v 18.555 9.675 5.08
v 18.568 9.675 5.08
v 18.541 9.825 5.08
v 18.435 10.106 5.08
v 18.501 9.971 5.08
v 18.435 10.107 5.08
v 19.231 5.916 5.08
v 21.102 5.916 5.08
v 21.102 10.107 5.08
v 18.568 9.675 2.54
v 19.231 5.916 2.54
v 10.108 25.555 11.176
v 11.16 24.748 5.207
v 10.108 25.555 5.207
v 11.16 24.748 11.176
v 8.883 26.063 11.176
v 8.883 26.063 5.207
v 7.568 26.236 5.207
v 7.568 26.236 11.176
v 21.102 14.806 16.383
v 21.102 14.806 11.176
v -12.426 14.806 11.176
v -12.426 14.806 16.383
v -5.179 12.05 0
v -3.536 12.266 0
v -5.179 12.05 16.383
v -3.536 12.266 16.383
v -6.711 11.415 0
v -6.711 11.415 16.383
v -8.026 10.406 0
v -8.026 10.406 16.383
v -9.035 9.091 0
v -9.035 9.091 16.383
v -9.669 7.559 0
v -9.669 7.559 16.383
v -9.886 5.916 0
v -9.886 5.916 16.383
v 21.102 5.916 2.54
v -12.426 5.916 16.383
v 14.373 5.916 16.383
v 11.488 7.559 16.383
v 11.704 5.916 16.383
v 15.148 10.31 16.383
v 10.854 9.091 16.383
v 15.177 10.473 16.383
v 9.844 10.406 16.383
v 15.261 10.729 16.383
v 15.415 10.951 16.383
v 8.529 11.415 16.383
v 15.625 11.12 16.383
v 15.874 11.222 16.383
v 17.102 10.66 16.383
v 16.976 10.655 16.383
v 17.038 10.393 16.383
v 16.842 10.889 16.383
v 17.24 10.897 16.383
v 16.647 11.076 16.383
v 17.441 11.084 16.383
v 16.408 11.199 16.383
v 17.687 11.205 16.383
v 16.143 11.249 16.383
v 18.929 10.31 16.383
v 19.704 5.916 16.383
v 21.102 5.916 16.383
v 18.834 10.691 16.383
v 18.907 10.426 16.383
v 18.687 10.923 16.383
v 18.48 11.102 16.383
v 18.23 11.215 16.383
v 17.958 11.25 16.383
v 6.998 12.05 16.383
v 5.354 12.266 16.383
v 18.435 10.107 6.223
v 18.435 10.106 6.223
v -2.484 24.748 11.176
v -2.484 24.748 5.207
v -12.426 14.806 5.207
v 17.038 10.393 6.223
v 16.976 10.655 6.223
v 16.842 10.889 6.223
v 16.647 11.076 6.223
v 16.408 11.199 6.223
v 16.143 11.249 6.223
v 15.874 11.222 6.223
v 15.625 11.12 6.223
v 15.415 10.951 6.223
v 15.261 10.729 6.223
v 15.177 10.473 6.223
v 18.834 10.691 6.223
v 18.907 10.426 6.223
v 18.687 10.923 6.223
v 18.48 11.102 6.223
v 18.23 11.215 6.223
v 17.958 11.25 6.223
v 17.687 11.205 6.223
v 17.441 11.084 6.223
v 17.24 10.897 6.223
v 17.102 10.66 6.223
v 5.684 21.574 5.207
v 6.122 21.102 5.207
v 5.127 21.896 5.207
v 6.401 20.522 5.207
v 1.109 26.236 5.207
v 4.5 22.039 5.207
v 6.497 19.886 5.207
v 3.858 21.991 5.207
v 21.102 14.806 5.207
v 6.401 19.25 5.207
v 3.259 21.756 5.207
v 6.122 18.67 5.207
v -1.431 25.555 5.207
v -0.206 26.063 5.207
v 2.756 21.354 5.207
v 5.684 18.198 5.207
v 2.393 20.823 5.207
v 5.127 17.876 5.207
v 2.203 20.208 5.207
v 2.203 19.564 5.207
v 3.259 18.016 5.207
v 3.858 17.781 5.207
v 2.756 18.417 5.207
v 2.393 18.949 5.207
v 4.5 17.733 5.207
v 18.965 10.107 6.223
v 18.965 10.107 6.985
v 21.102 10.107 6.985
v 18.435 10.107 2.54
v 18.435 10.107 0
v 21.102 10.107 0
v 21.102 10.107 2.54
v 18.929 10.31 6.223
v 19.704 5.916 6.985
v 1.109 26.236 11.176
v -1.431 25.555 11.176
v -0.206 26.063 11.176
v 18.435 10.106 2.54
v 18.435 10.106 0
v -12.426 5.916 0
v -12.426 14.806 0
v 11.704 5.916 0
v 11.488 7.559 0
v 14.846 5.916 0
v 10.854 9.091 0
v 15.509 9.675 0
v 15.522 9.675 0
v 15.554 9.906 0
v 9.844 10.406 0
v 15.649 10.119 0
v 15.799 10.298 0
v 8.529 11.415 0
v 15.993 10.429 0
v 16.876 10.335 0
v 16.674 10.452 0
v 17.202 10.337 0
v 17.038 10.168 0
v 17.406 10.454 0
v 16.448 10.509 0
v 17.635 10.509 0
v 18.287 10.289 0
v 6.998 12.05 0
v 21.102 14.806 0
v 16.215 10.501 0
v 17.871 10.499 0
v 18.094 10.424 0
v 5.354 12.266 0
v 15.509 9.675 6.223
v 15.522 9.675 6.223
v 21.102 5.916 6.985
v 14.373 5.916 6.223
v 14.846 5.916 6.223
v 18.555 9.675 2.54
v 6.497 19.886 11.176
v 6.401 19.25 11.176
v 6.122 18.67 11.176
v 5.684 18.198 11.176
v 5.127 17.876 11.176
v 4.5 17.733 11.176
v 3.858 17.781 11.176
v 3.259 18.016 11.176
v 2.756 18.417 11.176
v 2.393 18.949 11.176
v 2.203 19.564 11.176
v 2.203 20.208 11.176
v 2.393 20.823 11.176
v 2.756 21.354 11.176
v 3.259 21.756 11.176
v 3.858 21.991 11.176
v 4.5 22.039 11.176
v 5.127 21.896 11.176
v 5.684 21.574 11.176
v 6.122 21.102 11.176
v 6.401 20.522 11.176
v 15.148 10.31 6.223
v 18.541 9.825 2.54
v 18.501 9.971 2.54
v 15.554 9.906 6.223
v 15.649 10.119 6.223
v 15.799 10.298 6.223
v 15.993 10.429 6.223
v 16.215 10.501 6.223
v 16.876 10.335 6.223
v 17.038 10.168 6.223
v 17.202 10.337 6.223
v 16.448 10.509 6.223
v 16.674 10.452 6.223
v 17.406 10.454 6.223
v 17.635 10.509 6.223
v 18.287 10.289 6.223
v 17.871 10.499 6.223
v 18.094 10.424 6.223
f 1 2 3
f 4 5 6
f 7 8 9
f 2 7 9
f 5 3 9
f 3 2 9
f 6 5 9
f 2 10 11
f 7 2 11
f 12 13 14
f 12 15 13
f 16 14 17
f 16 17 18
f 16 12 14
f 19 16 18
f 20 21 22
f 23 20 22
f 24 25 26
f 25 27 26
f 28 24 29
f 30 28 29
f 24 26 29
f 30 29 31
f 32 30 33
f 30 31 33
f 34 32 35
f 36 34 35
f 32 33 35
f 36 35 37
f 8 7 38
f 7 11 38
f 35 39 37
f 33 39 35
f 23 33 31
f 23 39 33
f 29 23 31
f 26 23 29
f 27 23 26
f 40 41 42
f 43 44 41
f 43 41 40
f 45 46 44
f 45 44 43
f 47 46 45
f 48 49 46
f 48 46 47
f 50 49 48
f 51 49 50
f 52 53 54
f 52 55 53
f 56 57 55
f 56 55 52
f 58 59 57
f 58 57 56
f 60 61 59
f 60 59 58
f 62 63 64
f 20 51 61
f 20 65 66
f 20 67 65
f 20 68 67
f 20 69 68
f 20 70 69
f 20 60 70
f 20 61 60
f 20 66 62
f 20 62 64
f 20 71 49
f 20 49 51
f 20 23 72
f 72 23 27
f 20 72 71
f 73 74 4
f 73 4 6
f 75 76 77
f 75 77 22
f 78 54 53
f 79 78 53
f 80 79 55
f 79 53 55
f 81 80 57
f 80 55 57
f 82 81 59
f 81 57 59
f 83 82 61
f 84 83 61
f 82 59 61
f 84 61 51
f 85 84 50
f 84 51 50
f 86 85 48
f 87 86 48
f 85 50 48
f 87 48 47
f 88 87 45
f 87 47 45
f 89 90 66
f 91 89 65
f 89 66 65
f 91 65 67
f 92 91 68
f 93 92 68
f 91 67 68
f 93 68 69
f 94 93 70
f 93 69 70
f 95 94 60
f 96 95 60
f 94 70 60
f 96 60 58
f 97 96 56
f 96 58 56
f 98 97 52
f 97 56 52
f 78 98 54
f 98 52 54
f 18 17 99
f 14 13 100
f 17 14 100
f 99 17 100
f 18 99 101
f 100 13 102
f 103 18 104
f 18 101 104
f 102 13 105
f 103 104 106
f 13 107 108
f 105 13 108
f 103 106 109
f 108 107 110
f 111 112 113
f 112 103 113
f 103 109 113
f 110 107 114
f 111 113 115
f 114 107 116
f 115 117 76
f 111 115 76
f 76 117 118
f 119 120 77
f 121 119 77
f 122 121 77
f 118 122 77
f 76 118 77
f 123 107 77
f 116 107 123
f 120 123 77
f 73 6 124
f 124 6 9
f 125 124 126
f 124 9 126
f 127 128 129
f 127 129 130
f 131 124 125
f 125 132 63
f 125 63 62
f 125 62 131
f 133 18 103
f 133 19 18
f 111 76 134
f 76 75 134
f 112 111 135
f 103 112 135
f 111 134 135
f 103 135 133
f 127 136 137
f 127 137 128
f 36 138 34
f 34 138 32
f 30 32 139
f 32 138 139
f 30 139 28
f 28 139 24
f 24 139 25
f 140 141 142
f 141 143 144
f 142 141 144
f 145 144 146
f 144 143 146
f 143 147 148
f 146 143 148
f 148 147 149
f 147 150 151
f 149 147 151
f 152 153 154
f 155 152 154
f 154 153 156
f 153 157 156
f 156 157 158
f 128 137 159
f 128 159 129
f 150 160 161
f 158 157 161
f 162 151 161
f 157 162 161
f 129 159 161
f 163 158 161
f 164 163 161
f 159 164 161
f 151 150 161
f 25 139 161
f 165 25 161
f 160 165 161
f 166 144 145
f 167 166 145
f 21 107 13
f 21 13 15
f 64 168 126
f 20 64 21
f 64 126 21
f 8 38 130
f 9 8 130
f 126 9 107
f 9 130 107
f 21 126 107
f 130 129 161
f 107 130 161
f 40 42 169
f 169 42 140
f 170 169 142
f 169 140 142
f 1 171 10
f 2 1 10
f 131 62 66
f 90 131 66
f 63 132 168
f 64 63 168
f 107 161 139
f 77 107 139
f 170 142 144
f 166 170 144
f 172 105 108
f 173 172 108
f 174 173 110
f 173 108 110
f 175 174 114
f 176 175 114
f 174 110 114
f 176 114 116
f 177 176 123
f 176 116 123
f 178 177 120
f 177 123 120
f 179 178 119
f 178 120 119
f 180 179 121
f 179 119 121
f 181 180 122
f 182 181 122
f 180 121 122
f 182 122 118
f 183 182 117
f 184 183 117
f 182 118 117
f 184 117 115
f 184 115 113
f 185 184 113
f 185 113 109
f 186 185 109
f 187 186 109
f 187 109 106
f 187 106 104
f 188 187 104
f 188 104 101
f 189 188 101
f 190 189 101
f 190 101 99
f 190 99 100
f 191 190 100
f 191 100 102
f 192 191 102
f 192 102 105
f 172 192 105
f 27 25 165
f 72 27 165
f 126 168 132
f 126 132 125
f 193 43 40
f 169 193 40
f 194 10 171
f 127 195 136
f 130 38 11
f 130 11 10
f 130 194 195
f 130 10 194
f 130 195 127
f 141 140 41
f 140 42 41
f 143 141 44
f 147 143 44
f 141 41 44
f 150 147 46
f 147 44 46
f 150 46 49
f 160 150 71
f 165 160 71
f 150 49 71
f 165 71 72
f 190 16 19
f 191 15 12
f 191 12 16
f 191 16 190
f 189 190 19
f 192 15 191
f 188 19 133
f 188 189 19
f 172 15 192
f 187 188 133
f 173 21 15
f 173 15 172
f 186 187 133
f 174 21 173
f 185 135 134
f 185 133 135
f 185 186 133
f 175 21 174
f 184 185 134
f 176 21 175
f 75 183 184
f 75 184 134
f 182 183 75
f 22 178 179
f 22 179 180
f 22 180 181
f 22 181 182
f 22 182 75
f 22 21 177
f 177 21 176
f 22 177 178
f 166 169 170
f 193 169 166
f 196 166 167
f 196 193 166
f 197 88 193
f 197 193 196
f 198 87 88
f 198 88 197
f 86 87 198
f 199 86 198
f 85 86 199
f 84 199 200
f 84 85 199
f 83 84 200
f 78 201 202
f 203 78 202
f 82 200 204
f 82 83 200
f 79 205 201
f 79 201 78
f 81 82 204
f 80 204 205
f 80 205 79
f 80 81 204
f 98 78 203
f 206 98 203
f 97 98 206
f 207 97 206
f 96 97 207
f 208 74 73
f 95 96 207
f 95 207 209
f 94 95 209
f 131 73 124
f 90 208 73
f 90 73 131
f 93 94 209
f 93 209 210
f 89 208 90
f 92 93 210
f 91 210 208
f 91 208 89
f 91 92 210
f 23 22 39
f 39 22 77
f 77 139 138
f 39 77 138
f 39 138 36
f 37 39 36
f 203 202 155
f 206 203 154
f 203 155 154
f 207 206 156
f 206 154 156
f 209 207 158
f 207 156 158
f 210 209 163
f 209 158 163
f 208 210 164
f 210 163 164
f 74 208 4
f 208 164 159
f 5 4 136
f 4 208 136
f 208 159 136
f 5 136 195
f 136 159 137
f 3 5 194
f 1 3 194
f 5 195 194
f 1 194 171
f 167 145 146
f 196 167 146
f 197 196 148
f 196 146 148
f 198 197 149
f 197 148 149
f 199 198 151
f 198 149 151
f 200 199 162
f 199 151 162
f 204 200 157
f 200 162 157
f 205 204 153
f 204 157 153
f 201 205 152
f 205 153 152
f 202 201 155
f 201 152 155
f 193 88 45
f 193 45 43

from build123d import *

# Parameters (mm, degrees)
F1_DEPTH  = 16.383
F2_W      = 33.528
F2_H      = 5.969
F3_DEPTH  = 11.43
F4_SIZE   = 11.43
F5_R      = 2.159
F6_DEPTH  = 25.4
F8_DEPTH  = 6.35
F10_DEPTH = 10.16
F11_R     = 6.34999
F12_W     = 4.191
F12_H     = 2.54
F12_H_2   = 1.905
F13_DEPTH = 2.667
F14_R     = 5.08


# Not quite as in the source:
# - a fillet or chamfer is up to 0.001 mm smaller than in the source, because OpenCascade refuses the exact size


with BuildPart() as f1:
    # F0 (on Top) → F1 (new body)
    with BuildSketch(Plane.XY):
        Polygon((21.1023603916, 14.8059087365), (-12.4256396084, 14.8059087365), (-12.4256396084, 5.9159087365), (-9.8856396084, 5.9159087365), (-9.8856396084, 12.2659087365), (11.7043603916, 12.2659087365), (11.7043603916, 5.9159087365), (21.1023603916, 5.9159087365), align=None)
    extrude(amount=F1_DEPTH)

    # F2 (on face) → F3 (join)
    with BuildSketch(Plane(origin=(0, 14.8059087365, 0), x_dir=(-1, 0, 0), z_dir=(0, 1, 0))):
        with Locations((-4.3383603916, 8.1915)):
            Rectangle(F2_W, F2_H)
    extrude(amount=F3_DEPTH)

    # F4
    f4_edges = [f1.edges().sort_by_distance(p)[0] for p in [
        (-12.42564, 26.235909, 8.1915),
        (21.10236, 26.235909, 8.1915),
    ]]
    chamfer(f4_edges, length=F4_SIZE)

    # F5 (on face) → F6 (cut)
    with BuildSketch(Plane(origin=(0, 0, 5.207), x_dir=(1, 0, 0), z_dir=(0, 0, -1))):
        with Locations((4.3383603916, -19.8859087365)):
            Circle(F5_R)
    extrude(amount=-F6_DEPTH, mode=Mode.SUBTRACT)

    # F7 (on face) → F8 (cut)
    with BuildSketch(Plane(origin=(0, 0, 0), x_dir=(1, 0, 0), z_dir=(0, 0, -1))):
        with BuildLine():
            Line((18.5677868823, -9.6751087365), (19.2306352681, -5.9159087365))
            Line((19.2306352681, -5.9159087365), (14.846085515, -5.9159087365))
            Line((14.846085515, -5.9159087365), (15.5089339009, -9.6751087365))
            Line((15.5089339009, -9.6751087365), (15.5218644869, -9.6751087365))
            ThreePointArc((15.5218644869, -9.6751087365), (16.101190374, -10.4723310604), (17.0383603916, -10.1675454388))
            ThreePointArc((17.0383603916, -10.1675454388), (17.9755304092, -10.4723310604), (18.5548562962, -9.6751087365))
            Line((18.5548562962, -9.6751087365), (18.5677868823, -9.6751087365))
        make_face()
    extrude(amount=-F8_DEPTH, mode=Mode.SUBTRACT)

    # F9 (on face) → F10 (cut)
    with BuildSketch(Plane.XY.offset(16.383)):
        with BuildLine():
            Line((14.3731213639, 5.9159087365), (19.7035994193, 5.9159087365))
            Line((19.7035994193, 5.9159087365), (18.9287834006, 10.3101087365))
            Line((18.9287834006, 10.3101087365), (18.9070608822, 10.4264149788))
            ThreePointArc((18.9070608822, 10.4264149788), (17.9577526403, 11.2497597634), (17.0383603916, 10.3931381052))
            ThreePointArc((17.0383603916, 10.3931381052), (16.1426669703, 11.2490386173), (15.1767129861, 10.4733032939))
            Line((15.1767129861, 10.4733032939), (15.1479373825, 10.3101087365))
            Line((15.1479373825, 10.3101087365), (14.3731213639, 5.9159087365))
        make_face()
    extrude(amount=-F10_DEPTH, mode=Mode.SUBTRACT)

    # F11 (radius 6.35 in the source; OpenCascade refuses exactly that, so slightly less here)
    f11_edges = [f1.edges().sort_by_distance(p)[0] for p in [
        (11.70436, 12.265909, 8.1915),
        (-9.88564, 12.265909, 8.1915),
    ]]
    fillet(f11_edges, radius=F11_R)

    # F12 (on face) → F13 (cut)
    with BuildSketch(Plane.YZ.offset(21.1023603916)):
        with Locations((8.0114087365, 1.27)):
            Rectangle(F12_W, F12_H)
        with Locations((8.0114087365, 6.0325)):
            Rectangle(F12_W, F12_H_2)
    extrude(amount=-F13_DEPTH, mode=Mode.SUBTRACT)

    # F14
    f14_edges = [f1.edges().sort_by_distance(p)[0] for p in [
        (9.67236, 26.235909, 8.1915),
        (-0.99564, 26.235909, 8.1915),
    ]]
    fillet(f14_edges, radius=F14_R)


solid = f1.part
